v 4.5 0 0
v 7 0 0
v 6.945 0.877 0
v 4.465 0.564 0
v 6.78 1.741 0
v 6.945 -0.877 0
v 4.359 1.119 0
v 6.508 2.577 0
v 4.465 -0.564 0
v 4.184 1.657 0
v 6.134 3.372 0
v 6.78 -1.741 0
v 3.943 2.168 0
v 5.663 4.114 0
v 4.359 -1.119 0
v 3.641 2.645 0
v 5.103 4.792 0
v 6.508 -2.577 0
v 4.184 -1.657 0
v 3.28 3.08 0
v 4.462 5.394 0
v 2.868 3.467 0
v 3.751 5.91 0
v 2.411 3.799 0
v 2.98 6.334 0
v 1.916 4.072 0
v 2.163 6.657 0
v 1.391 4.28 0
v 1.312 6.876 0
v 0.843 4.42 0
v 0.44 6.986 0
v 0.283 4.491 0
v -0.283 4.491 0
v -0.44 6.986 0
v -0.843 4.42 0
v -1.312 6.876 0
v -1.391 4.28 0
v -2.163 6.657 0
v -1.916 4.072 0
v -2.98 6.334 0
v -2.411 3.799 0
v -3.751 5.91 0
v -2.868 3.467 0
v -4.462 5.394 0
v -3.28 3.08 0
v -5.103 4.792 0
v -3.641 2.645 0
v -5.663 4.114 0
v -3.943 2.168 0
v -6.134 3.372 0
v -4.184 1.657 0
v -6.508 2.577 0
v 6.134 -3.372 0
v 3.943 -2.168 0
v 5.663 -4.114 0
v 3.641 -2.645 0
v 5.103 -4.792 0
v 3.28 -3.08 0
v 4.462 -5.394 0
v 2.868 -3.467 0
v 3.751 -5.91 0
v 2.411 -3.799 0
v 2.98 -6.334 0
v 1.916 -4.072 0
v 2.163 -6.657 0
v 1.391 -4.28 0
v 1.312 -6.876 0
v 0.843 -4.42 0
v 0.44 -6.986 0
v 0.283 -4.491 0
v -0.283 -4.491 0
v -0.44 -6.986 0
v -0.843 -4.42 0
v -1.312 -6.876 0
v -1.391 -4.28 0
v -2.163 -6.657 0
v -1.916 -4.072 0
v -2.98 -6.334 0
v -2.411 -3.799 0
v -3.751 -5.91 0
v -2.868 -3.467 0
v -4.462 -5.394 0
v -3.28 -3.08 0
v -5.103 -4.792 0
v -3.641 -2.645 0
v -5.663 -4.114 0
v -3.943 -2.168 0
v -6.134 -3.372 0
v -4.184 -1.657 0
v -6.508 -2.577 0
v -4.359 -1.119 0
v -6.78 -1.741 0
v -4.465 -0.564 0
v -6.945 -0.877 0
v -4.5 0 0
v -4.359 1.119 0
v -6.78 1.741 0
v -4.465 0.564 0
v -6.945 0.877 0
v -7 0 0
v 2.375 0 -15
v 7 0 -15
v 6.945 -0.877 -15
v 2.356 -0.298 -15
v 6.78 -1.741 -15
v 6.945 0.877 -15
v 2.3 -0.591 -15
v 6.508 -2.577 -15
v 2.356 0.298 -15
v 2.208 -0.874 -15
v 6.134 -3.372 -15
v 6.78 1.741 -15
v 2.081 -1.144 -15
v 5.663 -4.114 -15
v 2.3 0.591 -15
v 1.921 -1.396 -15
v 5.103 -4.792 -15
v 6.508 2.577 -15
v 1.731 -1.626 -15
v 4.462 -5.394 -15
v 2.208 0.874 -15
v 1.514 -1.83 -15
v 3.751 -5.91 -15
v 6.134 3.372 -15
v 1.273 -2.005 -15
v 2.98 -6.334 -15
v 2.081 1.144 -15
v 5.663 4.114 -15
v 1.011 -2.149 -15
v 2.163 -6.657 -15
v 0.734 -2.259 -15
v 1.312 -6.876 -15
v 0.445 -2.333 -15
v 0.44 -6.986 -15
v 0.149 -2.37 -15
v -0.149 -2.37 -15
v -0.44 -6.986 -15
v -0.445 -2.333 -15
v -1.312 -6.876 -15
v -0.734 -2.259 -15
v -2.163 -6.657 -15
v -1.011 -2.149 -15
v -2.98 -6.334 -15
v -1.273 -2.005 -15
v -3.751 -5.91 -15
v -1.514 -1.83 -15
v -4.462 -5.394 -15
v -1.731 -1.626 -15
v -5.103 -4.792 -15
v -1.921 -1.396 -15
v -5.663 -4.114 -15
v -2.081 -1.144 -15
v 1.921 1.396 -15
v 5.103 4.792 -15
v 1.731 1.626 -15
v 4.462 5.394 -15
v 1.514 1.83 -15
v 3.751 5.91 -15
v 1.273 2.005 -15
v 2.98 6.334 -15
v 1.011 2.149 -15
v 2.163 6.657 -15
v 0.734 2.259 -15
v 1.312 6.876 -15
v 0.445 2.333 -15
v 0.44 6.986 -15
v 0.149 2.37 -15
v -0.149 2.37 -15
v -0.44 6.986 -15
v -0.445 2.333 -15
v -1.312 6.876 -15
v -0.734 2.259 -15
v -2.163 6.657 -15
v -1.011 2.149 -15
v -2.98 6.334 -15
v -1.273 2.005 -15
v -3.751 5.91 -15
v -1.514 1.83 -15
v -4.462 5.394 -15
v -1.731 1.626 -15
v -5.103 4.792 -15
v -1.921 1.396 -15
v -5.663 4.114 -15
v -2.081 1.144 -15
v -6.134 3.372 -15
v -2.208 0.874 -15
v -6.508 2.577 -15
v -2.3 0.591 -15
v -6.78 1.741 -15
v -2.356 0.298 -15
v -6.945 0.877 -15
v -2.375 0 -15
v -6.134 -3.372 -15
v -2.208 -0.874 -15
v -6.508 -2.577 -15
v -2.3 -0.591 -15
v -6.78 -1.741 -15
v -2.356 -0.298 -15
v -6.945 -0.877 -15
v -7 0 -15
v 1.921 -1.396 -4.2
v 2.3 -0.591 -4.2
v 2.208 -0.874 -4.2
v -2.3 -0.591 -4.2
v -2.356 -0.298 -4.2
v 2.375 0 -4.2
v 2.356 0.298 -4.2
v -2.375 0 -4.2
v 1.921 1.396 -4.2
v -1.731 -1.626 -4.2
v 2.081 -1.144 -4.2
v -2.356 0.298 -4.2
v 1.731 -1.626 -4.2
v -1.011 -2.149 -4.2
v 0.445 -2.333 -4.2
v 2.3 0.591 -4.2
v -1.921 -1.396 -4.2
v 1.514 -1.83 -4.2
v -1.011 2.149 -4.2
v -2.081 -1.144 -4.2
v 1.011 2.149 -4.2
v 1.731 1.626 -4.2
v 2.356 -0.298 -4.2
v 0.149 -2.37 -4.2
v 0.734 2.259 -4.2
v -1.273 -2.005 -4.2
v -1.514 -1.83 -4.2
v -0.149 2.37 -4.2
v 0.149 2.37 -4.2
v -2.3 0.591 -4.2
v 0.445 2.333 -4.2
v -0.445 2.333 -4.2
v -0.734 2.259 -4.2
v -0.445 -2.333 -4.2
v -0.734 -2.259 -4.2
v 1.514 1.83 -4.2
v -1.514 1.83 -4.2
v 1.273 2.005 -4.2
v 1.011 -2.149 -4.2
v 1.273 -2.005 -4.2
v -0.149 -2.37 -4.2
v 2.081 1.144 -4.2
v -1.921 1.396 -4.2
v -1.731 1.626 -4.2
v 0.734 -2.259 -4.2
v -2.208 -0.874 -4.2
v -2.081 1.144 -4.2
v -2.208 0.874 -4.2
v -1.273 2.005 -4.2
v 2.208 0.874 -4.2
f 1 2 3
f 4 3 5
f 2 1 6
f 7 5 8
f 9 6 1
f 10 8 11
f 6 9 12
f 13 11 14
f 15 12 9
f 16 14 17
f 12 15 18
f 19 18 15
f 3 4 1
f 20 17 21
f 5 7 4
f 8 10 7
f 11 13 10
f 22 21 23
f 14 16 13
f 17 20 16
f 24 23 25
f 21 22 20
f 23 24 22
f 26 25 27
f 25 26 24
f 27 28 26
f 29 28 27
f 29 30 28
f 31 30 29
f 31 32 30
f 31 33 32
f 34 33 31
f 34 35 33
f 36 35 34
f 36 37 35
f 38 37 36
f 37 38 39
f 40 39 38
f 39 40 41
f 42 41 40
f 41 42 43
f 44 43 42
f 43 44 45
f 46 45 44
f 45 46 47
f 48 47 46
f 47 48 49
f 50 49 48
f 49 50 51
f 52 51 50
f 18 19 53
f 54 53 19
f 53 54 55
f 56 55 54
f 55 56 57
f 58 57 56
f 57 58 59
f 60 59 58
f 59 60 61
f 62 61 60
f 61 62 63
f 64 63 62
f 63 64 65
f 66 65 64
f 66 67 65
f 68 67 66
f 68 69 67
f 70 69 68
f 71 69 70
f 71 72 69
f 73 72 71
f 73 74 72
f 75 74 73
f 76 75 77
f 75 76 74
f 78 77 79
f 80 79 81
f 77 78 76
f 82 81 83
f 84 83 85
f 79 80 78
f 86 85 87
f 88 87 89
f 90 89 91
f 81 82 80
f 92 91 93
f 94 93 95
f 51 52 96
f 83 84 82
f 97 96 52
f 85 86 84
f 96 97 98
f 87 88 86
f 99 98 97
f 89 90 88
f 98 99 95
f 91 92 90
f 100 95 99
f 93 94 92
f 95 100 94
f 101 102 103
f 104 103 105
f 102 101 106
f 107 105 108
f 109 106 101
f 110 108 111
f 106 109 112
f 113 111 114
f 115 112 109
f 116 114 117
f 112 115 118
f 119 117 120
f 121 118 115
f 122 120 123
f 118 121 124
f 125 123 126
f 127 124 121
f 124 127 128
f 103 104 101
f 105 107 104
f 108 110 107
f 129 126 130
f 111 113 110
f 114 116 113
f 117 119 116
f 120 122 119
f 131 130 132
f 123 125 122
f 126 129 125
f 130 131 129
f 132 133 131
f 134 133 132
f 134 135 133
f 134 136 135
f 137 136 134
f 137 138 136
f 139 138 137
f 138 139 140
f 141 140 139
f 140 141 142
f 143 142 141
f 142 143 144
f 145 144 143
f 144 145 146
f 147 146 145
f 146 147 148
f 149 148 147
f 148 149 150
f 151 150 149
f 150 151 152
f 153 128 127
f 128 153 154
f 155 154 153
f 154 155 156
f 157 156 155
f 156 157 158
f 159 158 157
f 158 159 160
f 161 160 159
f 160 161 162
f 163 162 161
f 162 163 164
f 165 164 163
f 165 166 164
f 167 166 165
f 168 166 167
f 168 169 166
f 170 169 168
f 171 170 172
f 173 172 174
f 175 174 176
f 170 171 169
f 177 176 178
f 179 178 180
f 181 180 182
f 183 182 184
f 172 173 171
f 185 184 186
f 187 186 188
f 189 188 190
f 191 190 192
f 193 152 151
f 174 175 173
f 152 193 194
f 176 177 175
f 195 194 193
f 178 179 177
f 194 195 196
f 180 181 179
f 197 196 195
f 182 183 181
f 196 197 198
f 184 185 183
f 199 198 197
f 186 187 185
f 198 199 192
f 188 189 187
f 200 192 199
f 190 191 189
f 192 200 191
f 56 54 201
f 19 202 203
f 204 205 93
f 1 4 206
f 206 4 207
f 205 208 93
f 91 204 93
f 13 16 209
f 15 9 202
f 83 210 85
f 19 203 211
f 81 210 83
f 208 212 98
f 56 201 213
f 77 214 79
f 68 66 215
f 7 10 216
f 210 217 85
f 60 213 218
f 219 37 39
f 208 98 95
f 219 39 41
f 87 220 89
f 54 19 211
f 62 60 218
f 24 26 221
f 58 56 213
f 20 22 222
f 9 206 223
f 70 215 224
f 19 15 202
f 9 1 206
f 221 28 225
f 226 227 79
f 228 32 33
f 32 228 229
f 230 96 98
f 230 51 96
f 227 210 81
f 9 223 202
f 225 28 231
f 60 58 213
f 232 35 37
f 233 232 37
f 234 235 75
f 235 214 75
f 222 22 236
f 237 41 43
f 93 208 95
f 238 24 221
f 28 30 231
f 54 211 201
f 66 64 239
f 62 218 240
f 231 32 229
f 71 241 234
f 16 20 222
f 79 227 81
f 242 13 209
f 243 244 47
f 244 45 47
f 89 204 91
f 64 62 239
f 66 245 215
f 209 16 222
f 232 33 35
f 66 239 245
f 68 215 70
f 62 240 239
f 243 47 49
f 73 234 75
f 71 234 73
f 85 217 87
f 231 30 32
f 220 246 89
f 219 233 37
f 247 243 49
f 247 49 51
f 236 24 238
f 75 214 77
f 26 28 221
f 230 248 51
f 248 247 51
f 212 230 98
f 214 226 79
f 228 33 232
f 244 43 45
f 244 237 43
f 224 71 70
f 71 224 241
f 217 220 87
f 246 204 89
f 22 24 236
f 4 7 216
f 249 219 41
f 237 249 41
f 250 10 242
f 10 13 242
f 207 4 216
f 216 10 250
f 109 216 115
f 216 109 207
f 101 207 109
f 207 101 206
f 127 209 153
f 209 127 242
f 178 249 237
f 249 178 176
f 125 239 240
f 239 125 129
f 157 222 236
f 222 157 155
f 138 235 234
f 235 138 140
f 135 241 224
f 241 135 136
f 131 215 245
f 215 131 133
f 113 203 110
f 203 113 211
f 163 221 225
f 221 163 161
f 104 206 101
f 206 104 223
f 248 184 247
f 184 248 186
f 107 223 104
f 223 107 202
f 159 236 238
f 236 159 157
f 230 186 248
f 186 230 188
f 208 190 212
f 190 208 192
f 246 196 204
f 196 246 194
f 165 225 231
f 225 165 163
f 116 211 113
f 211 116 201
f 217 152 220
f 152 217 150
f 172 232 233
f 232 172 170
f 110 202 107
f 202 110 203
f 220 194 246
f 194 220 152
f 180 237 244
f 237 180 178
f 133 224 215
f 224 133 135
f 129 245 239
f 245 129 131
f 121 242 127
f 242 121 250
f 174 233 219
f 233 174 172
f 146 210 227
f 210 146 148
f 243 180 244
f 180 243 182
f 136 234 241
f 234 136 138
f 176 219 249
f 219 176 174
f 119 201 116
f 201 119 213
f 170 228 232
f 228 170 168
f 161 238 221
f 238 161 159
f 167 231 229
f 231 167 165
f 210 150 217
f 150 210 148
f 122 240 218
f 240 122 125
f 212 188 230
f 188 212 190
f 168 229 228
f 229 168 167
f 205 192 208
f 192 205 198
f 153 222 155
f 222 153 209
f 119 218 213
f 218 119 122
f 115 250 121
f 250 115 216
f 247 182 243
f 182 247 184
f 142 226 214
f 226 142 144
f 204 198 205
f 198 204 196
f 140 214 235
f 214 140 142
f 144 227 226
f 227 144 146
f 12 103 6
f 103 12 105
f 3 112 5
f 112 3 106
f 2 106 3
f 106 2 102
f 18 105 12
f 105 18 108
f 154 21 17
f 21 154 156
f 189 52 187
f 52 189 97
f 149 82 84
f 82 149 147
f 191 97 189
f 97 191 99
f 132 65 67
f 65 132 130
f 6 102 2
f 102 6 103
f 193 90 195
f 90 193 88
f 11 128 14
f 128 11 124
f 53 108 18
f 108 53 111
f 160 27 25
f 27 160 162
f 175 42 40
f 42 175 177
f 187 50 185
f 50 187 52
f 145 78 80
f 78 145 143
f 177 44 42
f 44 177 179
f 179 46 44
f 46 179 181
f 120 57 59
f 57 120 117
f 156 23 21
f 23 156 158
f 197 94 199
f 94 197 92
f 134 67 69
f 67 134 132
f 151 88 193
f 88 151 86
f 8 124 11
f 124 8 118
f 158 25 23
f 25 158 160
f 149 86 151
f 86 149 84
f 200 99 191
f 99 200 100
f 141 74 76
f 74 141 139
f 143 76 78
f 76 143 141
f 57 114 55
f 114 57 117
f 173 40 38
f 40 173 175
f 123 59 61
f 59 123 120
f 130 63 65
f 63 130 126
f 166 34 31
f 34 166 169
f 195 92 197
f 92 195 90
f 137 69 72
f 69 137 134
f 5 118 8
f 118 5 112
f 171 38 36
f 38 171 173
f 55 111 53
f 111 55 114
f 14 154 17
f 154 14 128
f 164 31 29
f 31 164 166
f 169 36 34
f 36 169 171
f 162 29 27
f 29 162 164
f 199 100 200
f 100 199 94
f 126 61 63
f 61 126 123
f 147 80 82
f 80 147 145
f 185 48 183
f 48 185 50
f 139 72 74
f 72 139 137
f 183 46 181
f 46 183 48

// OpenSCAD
$fn = 50;


difference() {
	union() {
		translate(v = [0, 0, -15.0000000000]) {
			cylinder(h = 15, r = 7.0000000000);
		}
		cylinder(h = 0, r = 13.0000000000);
	}
	union() {
		translate(v = [0, 0, 0]) {
			rotate(a = [0, 0, 0]) {
				difference() {
					union() {
						#translate(v = [0, 0, -15.0000000000]) {
							cylinder(h = 15, r = 2.2500000000);
						}
						#translate(v = [0, 0, -4.2000000000]) {
							cylinder(h = 4.2000000000, r1 = 2.3750000000, r2 = 4.5000000000);
						}
						#translate(v = [0, 0, -15.0000000000]) {
							cylinder(h = 15, r = 2.3750000000);
						}
						#translate(v = [0, 0, -15.0000000000]) {
							cylinder(h = 15, r = 2.2500000000);
						}
					}
					union();
				}
			}
		}
	}
}
